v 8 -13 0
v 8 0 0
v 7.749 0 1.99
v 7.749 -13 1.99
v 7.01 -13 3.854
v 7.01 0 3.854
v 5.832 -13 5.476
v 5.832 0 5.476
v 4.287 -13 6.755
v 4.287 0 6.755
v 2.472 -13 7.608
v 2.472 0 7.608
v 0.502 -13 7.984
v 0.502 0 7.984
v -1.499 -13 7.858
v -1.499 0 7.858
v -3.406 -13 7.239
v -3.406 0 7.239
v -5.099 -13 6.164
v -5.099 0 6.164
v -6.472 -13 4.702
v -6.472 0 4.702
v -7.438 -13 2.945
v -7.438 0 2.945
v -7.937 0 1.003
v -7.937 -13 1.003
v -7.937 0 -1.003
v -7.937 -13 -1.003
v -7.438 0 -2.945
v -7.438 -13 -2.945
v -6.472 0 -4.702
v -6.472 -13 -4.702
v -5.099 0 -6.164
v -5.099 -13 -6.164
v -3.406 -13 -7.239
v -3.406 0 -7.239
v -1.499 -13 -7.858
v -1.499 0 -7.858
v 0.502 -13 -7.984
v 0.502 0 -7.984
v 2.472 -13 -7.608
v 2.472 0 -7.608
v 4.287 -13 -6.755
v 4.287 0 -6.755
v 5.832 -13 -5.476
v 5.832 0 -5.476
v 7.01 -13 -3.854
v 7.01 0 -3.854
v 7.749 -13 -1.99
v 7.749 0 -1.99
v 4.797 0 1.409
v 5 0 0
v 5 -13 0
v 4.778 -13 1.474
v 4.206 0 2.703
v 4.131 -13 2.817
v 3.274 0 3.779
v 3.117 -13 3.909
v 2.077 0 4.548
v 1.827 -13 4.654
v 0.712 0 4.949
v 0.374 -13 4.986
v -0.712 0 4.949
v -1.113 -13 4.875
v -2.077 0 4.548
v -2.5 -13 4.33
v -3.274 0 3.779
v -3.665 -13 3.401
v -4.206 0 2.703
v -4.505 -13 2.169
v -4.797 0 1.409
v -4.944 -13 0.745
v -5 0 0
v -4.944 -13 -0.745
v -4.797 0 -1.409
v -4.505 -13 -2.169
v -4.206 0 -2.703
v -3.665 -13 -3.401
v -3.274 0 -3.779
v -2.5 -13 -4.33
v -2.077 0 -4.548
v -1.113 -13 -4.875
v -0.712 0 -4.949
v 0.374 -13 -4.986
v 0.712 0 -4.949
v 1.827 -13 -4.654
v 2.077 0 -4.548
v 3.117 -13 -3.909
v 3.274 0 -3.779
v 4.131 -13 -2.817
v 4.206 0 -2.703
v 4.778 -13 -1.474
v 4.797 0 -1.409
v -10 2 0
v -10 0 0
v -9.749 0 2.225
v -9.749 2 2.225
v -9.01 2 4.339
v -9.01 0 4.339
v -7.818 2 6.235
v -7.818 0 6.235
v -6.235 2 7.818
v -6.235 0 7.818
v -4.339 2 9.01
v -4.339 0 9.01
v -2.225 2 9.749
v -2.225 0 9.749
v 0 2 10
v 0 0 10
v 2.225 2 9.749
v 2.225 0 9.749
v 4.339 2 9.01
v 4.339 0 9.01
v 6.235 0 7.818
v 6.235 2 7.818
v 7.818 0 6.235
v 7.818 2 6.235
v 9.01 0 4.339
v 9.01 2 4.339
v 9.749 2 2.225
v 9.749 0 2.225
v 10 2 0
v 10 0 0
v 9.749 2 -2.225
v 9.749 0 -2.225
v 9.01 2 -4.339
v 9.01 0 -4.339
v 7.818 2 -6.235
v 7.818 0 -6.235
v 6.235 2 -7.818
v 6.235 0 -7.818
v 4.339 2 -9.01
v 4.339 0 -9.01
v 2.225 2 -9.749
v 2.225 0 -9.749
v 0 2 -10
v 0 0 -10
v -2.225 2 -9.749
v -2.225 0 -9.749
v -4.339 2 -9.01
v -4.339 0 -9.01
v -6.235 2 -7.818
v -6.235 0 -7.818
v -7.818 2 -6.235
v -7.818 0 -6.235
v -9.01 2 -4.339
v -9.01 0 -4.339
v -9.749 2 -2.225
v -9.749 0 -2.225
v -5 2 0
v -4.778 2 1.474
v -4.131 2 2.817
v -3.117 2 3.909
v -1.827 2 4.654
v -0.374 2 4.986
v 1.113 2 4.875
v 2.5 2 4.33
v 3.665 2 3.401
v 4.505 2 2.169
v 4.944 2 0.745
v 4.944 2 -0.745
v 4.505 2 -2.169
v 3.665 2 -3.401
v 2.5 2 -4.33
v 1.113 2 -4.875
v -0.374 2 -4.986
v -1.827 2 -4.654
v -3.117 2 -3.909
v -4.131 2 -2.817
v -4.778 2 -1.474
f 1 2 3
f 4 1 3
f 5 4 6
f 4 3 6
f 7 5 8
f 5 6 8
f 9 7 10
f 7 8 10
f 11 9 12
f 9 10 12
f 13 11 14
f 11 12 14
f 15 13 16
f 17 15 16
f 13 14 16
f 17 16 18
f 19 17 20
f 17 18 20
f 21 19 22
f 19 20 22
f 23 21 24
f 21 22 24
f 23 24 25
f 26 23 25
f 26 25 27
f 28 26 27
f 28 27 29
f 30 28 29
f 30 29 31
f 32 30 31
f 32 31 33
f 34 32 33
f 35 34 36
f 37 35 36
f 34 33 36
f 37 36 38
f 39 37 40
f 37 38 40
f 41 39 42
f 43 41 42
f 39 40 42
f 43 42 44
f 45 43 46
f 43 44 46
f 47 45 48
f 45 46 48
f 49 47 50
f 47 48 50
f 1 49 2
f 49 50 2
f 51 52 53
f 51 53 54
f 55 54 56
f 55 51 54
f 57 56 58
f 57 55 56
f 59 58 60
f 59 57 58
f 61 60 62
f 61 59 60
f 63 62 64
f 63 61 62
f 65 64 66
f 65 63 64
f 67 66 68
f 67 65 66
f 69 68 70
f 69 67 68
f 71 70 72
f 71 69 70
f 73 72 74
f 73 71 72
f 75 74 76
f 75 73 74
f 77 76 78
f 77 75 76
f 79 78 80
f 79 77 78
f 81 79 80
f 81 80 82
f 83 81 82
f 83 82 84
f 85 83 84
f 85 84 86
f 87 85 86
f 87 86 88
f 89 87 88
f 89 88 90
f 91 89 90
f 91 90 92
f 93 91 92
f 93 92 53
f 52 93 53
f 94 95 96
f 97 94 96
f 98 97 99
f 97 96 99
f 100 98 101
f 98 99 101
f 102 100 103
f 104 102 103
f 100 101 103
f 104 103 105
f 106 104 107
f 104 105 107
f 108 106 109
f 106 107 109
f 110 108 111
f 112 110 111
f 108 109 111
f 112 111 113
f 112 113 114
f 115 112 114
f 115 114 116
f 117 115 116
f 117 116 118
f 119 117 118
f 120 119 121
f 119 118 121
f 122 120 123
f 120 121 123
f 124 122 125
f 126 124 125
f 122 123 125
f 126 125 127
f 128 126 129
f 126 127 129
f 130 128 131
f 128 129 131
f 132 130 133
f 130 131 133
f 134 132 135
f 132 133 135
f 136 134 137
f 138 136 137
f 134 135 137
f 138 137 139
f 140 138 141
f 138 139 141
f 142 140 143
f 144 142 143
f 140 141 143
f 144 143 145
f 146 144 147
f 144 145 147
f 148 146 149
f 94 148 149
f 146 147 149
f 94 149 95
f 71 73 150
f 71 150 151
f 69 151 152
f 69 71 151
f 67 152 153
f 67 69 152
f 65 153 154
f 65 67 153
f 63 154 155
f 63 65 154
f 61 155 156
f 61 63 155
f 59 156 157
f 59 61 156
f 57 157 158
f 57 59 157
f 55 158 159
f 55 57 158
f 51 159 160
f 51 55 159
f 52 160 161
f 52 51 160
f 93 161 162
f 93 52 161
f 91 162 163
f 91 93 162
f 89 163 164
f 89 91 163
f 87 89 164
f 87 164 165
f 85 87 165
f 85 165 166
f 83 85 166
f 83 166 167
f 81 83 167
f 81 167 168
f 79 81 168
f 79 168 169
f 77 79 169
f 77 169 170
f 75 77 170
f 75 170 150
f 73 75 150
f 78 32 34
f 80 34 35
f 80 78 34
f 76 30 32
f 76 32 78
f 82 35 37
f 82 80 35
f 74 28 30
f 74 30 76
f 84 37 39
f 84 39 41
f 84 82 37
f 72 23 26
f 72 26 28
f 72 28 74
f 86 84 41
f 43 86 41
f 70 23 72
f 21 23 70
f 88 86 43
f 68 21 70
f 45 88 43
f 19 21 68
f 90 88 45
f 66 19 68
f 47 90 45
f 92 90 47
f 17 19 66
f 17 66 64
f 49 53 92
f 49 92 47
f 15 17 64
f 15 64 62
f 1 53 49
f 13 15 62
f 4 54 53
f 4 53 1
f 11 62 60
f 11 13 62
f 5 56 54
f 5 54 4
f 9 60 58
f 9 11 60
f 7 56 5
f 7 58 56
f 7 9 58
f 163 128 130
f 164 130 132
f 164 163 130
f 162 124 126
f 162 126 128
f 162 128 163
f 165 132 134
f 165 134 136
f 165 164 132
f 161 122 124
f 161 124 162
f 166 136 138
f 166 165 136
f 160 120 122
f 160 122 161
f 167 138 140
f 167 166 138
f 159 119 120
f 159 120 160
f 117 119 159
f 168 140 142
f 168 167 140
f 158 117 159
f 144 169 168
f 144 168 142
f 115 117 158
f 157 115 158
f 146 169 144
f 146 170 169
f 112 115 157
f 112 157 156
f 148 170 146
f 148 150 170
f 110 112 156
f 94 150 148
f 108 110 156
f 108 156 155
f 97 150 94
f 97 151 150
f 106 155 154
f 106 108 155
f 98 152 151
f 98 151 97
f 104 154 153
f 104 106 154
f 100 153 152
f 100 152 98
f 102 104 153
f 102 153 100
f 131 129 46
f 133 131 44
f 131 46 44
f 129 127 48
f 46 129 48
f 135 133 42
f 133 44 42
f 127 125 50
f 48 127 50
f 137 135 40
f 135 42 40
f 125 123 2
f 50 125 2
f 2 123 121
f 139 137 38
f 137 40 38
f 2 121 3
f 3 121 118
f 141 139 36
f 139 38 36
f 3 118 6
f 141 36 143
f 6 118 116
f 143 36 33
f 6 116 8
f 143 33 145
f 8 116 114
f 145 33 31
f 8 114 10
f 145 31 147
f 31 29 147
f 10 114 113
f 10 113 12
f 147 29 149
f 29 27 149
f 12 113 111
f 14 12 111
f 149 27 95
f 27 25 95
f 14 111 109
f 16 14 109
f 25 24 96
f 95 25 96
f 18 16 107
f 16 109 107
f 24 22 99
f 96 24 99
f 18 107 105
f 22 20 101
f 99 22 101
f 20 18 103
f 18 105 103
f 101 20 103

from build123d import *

# Parameters (mm, degrees)
F0_R     = 8
F0_R_2   = 5
F1_DEPTH = 13
F2_R     = 10
F2_R_2   = 5
F3_DEPTH = 2


with BuildPart() as f1:
    # F0 (on Front) → F1 (new body)
    with BuildSketch(Plane.XZ):
        Circle(F0_R)
        Circle(F0_R_2, mode=Mode.SUBTRACT)
    extrude(amount=F1_DEPTH)

    # F2 (on face) → F3 (join)
    with BuildSketch(Plane(origin=(0, 0, 0), x_dir=(-1, 0, 0), z_dir=(0, 1, 0))):
        Circle(F2_R)
        Circle(F2_R_2, mode=Mode.SUBTRACT)
    extrude(amount=F3_DEPTH)


solid = f1.part
